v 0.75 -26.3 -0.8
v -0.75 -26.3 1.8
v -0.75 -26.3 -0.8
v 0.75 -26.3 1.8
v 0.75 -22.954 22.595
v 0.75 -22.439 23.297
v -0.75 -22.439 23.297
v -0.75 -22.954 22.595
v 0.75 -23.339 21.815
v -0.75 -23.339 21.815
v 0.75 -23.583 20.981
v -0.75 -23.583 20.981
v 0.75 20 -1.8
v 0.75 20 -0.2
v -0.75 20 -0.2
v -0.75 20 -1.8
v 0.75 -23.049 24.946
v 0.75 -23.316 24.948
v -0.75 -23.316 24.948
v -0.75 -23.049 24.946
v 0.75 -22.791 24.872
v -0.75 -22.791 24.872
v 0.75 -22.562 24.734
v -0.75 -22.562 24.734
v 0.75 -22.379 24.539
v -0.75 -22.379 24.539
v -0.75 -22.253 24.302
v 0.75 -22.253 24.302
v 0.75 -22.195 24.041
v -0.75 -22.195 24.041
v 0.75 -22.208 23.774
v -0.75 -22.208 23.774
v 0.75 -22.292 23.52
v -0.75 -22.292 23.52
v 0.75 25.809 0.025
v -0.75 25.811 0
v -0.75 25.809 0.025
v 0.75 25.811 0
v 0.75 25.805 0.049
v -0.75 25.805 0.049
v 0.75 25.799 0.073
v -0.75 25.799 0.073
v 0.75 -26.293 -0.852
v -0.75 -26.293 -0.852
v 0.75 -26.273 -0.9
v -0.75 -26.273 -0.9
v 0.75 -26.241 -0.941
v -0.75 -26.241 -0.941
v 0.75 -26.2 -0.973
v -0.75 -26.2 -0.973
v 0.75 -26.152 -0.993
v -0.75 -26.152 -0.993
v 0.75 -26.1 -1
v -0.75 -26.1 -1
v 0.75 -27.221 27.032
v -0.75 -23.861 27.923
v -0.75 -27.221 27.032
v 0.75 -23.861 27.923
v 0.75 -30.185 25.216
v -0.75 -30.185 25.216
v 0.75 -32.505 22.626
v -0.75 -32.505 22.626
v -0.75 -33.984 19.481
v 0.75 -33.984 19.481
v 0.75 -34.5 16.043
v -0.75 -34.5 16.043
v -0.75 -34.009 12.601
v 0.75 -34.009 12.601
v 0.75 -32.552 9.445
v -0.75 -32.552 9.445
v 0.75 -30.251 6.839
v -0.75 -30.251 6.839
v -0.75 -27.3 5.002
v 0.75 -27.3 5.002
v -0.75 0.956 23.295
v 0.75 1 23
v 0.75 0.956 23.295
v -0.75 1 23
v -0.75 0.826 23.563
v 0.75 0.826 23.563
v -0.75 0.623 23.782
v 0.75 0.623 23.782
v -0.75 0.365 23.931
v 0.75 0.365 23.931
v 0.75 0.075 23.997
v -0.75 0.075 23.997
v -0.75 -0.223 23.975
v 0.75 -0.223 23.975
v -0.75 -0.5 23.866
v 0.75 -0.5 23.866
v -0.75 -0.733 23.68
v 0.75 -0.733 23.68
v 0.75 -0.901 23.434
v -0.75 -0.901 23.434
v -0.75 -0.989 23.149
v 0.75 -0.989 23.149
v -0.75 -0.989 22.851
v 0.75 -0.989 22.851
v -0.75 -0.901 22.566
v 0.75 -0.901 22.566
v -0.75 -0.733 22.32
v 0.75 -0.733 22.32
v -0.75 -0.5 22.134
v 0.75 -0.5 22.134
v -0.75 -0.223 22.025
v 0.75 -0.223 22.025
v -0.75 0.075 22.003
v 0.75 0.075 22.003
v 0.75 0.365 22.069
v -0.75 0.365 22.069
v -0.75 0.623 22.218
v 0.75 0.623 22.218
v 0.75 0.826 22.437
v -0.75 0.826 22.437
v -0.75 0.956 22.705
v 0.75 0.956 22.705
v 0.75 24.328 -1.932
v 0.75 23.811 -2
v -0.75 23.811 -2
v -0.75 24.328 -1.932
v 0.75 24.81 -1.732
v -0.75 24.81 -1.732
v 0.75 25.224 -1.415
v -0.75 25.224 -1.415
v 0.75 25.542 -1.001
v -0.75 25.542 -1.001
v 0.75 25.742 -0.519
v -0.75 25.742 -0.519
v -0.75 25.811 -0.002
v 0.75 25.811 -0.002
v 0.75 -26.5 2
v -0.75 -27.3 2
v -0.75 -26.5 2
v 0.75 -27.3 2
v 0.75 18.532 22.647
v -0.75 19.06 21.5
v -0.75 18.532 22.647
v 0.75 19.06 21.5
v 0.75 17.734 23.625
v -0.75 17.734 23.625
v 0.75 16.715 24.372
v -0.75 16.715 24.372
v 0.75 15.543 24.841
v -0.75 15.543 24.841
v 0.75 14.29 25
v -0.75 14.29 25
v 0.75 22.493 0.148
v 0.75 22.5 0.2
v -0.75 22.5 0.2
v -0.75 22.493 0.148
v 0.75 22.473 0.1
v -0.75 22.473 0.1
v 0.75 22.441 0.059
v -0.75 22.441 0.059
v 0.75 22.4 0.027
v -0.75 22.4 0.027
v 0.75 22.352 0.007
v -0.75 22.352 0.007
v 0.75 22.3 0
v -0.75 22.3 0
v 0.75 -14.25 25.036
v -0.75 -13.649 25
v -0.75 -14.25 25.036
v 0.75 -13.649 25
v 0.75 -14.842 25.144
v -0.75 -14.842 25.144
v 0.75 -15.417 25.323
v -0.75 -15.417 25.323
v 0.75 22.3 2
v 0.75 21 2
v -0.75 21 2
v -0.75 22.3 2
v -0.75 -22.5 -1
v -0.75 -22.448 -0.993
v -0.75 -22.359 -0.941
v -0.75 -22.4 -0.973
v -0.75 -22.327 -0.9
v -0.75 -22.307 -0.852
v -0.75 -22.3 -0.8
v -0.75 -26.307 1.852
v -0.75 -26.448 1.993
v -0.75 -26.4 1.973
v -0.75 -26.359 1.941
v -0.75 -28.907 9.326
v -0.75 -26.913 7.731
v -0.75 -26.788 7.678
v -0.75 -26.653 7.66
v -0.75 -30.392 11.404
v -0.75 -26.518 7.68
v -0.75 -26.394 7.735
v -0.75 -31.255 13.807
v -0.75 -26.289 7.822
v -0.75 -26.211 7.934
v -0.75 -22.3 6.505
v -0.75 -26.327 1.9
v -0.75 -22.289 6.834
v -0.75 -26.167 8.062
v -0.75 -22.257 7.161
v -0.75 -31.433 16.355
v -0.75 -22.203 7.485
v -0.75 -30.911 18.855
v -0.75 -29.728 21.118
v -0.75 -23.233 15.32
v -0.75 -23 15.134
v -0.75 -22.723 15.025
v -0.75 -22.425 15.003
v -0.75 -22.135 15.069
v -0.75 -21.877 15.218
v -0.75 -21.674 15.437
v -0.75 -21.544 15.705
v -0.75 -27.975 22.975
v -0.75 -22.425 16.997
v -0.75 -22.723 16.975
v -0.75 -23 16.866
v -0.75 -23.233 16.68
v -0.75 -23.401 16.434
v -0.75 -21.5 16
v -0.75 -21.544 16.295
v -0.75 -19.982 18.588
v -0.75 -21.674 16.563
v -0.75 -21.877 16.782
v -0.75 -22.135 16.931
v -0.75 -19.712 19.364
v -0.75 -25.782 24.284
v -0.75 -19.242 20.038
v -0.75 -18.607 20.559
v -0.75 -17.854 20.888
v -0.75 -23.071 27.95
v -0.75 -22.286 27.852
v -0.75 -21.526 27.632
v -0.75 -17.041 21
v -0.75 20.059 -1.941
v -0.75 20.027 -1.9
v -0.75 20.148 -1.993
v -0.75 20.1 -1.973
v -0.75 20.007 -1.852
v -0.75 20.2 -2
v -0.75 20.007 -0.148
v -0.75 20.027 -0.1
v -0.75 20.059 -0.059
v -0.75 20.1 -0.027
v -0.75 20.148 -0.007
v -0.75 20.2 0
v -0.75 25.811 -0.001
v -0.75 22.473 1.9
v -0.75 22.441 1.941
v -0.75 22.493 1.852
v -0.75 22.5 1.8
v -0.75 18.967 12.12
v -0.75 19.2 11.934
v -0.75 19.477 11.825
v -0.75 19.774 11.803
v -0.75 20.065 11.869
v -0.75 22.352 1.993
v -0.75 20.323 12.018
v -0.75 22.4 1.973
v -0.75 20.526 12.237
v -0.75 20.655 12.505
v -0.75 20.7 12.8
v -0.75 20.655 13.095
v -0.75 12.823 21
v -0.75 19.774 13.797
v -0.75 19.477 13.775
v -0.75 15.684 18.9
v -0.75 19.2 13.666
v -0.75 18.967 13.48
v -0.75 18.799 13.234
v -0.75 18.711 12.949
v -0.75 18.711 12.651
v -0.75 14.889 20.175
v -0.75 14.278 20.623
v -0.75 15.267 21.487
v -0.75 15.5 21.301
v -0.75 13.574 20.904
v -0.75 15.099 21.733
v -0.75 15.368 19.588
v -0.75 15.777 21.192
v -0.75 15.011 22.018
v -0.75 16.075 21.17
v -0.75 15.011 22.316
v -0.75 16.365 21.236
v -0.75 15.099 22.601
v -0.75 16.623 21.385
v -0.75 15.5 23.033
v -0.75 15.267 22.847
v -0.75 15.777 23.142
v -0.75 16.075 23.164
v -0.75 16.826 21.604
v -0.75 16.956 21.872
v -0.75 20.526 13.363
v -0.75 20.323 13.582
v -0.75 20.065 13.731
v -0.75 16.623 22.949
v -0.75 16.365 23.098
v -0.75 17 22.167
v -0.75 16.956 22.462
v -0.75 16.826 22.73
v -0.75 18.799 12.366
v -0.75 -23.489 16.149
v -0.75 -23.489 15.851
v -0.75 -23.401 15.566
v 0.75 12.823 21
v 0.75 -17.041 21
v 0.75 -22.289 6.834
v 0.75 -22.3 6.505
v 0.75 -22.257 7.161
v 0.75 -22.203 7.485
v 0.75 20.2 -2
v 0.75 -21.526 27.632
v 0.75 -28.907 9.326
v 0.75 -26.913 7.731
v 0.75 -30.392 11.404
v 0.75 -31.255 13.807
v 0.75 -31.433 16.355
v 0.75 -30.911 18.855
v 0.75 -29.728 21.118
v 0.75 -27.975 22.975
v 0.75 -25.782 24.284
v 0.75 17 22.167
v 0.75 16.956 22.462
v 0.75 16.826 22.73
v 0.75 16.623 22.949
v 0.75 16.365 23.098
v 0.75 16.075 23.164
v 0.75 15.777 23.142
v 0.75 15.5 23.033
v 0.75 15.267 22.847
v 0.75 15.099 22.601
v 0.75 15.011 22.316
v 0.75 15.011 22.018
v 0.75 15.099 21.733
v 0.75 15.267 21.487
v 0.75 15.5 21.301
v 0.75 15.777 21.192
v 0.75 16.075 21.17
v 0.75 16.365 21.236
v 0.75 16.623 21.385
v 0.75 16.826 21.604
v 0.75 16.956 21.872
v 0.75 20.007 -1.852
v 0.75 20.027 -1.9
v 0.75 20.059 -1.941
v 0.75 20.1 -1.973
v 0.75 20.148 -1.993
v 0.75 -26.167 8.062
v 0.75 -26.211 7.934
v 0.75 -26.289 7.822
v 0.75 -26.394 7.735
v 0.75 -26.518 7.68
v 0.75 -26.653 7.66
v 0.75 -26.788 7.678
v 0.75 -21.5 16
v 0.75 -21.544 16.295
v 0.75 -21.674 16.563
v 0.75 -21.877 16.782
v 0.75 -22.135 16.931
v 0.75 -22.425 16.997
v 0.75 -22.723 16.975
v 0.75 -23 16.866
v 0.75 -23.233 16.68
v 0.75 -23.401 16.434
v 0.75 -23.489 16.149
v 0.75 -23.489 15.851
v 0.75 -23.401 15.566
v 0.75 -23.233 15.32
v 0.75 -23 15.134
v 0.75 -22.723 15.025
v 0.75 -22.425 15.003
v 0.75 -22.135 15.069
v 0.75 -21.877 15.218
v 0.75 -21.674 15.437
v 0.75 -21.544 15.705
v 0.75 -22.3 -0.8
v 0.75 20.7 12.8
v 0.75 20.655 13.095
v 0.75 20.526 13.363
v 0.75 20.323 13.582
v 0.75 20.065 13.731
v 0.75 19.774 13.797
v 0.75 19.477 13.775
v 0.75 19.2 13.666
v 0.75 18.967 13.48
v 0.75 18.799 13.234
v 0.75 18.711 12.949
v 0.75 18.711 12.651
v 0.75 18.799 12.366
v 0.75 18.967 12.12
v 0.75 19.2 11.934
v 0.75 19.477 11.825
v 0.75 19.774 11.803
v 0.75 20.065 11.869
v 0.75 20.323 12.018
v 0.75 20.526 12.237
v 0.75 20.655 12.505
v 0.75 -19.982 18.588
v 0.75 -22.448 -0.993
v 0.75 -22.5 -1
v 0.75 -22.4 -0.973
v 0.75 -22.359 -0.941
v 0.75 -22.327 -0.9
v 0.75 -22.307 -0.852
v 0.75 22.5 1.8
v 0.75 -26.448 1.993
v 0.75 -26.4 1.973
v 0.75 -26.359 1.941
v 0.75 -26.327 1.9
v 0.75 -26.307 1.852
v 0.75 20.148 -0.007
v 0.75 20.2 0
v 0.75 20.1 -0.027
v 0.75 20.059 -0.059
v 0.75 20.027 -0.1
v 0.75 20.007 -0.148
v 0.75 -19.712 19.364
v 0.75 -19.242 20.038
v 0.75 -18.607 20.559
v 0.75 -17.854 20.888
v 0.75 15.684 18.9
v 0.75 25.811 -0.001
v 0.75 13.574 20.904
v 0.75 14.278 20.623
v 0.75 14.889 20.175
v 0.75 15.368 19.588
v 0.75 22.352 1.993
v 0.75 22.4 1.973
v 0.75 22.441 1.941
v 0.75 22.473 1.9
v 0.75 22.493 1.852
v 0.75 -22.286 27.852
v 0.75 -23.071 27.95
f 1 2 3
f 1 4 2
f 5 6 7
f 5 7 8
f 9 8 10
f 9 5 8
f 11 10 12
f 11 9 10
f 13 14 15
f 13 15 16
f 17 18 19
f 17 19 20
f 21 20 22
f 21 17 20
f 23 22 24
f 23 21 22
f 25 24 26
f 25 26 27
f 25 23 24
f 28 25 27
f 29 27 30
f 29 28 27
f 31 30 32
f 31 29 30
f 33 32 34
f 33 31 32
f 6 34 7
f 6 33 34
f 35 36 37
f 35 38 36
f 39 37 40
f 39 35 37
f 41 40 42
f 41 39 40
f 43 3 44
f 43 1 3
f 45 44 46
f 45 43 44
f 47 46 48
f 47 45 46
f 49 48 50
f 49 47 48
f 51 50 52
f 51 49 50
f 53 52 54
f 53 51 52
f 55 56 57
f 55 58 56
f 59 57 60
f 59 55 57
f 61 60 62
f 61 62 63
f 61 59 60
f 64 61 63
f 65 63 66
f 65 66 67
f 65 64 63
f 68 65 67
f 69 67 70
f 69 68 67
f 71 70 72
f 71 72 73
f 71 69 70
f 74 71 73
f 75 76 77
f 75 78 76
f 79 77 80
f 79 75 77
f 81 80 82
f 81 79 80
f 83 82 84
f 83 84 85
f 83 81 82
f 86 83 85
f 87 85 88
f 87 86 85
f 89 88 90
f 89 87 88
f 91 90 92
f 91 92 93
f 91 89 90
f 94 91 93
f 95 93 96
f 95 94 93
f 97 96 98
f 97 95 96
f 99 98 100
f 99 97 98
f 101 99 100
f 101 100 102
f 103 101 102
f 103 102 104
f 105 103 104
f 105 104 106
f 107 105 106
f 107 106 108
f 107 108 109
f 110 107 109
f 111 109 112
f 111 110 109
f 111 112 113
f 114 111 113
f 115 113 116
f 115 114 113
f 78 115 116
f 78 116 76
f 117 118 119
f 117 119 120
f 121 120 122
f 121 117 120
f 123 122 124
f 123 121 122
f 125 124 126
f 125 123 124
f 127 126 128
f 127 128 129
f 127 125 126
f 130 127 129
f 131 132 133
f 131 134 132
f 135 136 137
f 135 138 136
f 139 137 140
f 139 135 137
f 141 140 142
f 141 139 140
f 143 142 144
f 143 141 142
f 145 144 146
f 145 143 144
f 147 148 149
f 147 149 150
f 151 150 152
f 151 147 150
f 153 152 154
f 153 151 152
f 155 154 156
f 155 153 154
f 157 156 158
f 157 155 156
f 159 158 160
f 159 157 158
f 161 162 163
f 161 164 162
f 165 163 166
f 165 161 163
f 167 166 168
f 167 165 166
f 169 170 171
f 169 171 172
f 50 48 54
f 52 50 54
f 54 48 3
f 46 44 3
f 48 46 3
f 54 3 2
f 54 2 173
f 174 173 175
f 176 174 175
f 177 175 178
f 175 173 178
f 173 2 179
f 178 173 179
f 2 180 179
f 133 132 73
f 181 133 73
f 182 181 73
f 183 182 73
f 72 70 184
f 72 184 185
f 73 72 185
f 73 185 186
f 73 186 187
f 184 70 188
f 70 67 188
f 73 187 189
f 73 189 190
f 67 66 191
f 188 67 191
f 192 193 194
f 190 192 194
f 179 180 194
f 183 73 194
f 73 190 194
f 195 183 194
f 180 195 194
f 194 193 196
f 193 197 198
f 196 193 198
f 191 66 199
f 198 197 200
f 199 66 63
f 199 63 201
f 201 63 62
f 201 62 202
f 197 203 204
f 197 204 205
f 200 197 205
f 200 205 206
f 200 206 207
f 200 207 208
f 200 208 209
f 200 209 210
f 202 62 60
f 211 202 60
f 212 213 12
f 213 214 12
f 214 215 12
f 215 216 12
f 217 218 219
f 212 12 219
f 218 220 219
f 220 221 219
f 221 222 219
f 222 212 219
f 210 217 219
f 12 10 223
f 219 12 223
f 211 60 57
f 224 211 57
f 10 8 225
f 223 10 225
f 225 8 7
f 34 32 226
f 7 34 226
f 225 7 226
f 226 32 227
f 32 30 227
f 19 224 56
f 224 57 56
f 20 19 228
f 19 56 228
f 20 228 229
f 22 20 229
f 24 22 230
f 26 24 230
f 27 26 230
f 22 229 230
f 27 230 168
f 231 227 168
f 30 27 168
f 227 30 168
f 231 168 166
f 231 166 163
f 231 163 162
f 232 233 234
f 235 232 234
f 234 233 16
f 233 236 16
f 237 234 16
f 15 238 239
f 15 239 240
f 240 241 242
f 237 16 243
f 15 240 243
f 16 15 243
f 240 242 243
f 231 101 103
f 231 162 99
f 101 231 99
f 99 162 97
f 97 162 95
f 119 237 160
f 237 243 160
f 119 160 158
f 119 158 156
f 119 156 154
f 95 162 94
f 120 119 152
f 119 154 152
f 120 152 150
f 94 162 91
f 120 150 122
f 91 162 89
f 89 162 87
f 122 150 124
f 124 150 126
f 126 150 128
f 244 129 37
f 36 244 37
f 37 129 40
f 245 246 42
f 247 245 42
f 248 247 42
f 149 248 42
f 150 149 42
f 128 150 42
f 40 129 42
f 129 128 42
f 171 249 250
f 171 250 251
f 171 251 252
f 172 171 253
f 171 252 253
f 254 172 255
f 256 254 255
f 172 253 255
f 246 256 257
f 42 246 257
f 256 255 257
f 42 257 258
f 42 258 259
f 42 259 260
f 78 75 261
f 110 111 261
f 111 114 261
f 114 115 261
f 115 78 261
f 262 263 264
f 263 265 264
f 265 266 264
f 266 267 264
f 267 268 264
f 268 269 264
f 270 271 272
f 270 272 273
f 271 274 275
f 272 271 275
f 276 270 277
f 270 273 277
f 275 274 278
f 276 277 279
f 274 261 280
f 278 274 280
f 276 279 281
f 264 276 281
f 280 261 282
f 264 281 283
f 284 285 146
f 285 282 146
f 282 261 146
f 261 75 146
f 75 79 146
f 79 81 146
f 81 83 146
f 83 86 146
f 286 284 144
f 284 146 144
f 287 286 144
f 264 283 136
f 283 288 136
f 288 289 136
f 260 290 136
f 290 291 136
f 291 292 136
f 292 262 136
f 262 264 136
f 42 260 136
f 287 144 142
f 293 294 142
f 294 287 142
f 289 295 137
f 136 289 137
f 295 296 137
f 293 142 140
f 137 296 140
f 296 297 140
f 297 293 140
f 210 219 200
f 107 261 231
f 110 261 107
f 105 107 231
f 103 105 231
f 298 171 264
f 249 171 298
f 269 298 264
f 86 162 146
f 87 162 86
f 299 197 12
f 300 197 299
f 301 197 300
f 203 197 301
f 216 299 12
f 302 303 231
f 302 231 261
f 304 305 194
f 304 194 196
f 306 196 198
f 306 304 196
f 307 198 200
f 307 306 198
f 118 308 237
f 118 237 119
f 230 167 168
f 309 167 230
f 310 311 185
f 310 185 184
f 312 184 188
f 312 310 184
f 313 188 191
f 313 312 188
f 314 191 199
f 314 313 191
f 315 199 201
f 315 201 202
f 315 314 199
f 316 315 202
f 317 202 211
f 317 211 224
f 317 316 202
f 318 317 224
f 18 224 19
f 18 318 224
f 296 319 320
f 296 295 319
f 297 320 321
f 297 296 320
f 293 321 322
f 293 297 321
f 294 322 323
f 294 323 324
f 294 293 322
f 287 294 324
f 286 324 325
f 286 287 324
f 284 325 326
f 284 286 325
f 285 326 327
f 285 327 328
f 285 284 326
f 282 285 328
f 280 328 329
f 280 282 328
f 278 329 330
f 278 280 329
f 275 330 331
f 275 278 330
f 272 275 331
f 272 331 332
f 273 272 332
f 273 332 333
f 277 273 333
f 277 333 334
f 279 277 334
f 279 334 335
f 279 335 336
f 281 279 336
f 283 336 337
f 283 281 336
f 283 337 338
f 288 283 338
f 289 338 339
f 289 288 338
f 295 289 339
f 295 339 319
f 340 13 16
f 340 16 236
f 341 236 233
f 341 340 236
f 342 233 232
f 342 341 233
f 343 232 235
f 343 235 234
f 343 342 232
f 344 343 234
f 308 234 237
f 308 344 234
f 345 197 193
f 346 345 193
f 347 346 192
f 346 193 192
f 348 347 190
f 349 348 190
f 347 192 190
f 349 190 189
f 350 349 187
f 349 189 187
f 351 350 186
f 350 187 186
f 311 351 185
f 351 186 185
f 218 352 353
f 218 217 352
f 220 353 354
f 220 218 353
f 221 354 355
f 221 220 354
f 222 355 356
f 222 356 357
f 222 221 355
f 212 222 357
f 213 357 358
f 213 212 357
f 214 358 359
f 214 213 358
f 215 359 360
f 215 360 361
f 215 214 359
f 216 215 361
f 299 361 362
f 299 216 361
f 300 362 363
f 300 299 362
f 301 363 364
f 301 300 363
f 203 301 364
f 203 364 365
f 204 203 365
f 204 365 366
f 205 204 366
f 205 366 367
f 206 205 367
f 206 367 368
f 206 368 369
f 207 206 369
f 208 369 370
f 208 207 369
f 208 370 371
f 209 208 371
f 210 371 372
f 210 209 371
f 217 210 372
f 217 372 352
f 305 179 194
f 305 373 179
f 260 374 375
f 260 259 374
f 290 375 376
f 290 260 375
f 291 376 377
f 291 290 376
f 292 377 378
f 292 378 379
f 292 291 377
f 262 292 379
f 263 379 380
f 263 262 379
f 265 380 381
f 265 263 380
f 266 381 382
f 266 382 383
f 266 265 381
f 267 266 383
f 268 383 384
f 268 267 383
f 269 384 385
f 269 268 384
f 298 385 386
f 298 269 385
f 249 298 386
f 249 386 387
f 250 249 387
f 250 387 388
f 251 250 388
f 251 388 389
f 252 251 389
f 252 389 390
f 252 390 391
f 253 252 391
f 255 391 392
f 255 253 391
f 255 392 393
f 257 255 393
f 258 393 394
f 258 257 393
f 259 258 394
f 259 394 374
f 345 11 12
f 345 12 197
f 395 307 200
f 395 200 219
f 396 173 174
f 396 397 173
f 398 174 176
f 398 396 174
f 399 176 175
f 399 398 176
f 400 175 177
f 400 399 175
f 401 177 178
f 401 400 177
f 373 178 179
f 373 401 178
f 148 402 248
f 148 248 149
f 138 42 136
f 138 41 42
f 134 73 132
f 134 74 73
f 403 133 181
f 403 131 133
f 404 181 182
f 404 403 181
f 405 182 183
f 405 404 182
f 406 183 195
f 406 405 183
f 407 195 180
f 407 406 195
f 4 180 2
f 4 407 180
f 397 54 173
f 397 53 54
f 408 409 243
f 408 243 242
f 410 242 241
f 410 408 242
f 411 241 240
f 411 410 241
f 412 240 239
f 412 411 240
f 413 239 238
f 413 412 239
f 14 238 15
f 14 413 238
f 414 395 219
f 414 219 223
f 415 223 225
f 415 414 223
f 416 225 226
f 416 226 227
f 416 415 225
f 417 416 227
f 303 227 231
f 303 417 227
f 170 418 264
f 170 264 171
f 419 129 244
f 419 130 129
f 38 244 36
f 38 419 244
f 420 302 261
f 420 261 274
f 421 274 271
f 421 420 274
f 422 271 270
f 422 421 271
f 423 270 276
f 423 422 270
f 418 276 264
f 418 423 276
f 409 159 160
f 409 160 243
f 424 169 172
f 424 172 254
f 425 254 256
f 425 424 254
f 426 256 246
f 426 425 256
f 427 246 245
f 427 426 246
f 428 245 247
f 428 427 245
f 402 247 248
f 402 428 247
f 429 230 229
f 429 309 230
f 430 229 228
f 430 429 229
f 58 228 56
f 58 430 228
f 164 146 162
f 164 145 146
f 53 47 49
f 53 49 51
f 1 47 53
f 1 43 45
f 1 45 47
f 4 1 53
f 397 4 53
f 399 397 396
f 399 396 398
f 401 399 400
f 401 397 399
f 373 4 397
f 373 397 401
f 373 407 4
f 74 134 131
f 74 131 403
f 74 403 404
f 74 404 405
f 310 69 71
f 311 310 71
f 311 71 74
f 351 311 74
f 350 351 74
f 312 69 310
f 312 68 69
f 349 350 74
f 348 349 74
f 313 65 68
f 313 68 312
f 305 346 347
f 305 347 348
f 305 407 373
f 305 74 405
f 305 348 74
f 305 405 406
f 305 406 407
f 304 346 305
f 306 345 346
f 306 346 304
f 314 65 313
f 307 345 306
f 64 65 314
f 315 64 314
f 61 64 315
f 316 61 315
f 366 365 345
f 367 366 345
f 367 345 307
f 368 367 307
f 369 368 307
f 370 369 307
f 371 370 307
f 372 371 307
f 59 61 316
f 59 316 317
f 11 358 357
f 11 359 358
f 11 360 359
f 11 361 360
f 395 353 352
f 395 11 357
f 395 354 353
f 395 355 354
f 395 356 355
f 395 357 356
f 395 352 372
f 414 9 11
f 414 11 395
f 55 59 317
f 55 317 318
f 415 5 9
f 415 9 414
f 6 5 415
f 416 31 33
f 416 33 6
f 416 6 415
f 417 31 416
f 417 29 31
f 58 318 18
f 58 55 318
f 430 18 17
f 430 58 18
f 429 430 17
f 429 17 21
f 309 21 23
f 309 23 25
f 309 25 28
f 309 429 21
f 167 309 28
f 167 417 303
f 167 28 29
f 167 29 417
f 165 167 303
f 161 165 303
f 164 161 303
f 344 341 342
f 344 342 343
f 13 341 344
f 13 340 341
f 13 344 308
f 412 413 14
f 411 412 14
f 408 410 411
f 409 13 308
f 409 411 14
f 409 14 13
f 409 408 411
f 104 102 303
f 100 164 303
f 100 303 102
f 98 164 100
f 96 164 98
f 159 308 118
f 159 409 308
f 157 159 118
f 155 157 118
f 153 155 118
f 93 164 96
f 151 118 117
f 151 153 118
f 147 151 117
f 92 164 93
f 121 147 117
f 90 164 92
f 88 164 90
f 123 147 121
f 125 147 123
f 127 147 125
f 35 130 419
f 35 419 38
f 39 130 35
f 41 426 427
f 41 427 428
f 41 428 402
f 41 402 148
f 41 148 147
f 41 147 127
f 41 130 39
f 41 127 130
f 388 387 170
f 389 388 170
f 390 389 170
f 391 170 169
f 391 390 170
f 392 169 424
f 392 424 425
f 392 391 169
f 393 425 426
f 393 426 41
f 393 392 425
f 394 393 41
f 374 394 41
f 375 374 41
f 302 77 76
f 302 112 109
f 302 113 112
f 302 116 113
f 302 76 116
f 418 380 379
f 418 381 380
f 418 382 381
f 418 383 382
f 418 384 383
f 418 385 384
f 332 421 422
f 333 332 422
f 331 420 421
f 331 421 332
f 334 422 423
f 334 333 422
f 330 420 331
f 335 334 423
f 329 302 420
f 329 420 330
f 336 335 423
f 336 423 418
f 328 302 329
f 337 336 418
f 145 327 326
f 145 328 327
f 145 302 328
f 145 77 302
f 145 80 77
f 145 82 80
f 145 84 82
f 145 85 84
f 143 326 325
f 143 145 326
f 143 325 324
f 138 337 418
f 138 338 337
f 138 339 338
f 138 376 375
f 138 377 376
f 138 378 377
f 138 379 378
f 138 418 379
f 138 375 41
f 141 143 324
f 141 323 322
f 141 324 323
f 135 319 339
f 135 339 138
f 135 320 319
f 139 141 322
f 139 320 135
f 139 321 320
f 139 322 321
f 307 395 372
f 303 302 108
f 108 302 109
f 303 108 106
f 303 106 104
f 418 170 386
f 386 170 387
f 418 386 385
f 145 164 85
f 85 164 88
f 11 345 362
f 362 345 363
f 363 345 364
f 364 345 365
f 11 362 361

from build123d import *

# Parameters (mm, degrees)
F0_R     = 1
F1_DEPTH = 0.75


# Not quite as in the source:
# - ends of sketch curves that miss each other by under 0.0002 mm in the source are joined
# - a feature names something its author has since deleted; it is built from what else it names


with BuildPart() as f1:
    # F0 (on Right) → F1 (new body, symmetric)
    with BuildSketch(Plane.YZ):
        with BuildLine():
            Line((-22.3, -0.8), (-22.3, 6.504902432))
            ThreePointArc((-22.3, 6.504902432), (-22.2756666333, 6.9975905219), (-22.2029033785, 7.4854831077))
            Line((-22.2029033785, 7.4854831077), (-19.9823303189, 18.5883484054))
            ThreePointArc((-19.9823303189, 18.5883484054), (-18.9425550087, 20.320026424), (-17.0405882918, 21))
            Line((-17.0405882918, 21), (12.8226720923, 21))
            ThreePointArc((12.8226720923, 21), (14.5974500424, 20.4187110675), (15.6844554724, 18.9001088187))
            Line((15.6844554724, 18.9001088187), (21, 2))
            Line((21, 2), (22.3, 2))
            ThreePointArc((22.3, 2), (22.4414213562, 1.9414213562), (22.5, 1.8))
            Line((22.5, 1.8), (22.5, 0.2))
            ThreePointArc((22.5, 0.2), (22.4414213562, 0.0585786438), (22.3, 0))
            Line((22.3, 0), (20.2, 0))
            ThreePointArc((20.2, 0), (20.0585786438, -0.0585786438), (20, -0.2))
            Line((20, -0.2), (20, -1.8))
            ThreePointArc((20, -1.8), (20.0585786438, -1.9414213562), (20.2, -2))
            Line((20.2, -2), (23.8107259146, -2))
            ThreePointArc((23.8107259146, -2), (25.2243140233, -1.4148387396), (25.8107251326, -0.001768659))
            ThreePointArc((25.8107251326, -0.001768659), (25.8107257191, -0.0008843296), (25.8107259146, 0))
            ThreePointArc((25.8107259146, 0), (25.8076938609, 0.0370492941), (25.799207863, 0.0732404086))
            Line((25.799207863, 0.0732404086), (19.059851332, 21.5001813645))
            ThreePointArc((19.059851332, 21.5001813645), (17.2481756153, 24.0311851125), (14.2902123652, 25))
            Line((14.2902123652, 25), (-13.6493669984, 25))
            ThreePointArc((-13.6493669984, 25), (-14.5478772467, 25.0813945743), (-15.4171339514, 25.3229282665))
            Line((-15.4171339514, 25.3229282665), (-21.5261195006, 27.6319077703))
            ThreePointArc((-21.5261195006, 27.6319077703), (-22.6761929546, 27.9165348126), (-23.8609482061, 27.9225760631))
            ThreePointArc((-23.8609482061, 27.9225760631), (-34.3671649706, 17.7805604622), (-27.3, 5.0018183321))
            Line((-27.3, 5.0018183321), (-27.3, 2))
            Line((-27.3, 2), (-26.5, 2))
            ThreePointArc((-26.5, 2), (-26.3585786438, 1.9414213562), (-26.3, 1.8))
            Line((-26.3, 1.8), (-26.3, -0.8))
            ThreePointArc((-26.3, -0.8), (-26.2414213562, -0.9414213562), (-26.1, -1))
            Line((-26.1, -1), (-22.5, -1))
            ThreePointArc((-22.5, -1), (-22.3585786438, -0.9414213562), (-22.3, -0.8))
        make_face()
        with Locations((19.6997005895, 12.8)):
            Circle(F0_R, mode=Mode.SUBTRACT)
        with BuildLine():
            Line((-23.5830994757, 20.9805806757), (-26.1667940449, 8.0621078301))
            ThreePointArc((-26.1667940449, 8.0621078301), (-26.4540531191, 7.7032432499), (-26.9129154865, 7.7305725477))
            ThreePointArc((-26.9129154865, 7.7305725477), (-31.2579507019, 17.6226927508), (-23.3162298506, 24.9481581324))
            ThreePointArc((-23.3162298506, 24.9481581324), (-22.308062771, 24.4249028415), (-22.4394560446, 23.2966596198))
            ThreePointArc((-22.4394560446, 23.2966596198), (-23.1634230366, 22.2137470973), (-23.5830994757, 20.9805806757))
        make_face(mode=Mode.SUBTRACT)
        with Locations((-22.5, 16)):
            Circle(F0_R, mode=Mode.SUBTRACT)
        with Locations((0, 23)):
            Circle(F0_R, mode=Mode.SUBTRACT)
        with Locations((16, 22.1668636565)):
            Circle(F0_R, mode=Mode.SUBTRACT)
    extrude(amount=F1_DEPTH, both=True)


solid = f1.part
